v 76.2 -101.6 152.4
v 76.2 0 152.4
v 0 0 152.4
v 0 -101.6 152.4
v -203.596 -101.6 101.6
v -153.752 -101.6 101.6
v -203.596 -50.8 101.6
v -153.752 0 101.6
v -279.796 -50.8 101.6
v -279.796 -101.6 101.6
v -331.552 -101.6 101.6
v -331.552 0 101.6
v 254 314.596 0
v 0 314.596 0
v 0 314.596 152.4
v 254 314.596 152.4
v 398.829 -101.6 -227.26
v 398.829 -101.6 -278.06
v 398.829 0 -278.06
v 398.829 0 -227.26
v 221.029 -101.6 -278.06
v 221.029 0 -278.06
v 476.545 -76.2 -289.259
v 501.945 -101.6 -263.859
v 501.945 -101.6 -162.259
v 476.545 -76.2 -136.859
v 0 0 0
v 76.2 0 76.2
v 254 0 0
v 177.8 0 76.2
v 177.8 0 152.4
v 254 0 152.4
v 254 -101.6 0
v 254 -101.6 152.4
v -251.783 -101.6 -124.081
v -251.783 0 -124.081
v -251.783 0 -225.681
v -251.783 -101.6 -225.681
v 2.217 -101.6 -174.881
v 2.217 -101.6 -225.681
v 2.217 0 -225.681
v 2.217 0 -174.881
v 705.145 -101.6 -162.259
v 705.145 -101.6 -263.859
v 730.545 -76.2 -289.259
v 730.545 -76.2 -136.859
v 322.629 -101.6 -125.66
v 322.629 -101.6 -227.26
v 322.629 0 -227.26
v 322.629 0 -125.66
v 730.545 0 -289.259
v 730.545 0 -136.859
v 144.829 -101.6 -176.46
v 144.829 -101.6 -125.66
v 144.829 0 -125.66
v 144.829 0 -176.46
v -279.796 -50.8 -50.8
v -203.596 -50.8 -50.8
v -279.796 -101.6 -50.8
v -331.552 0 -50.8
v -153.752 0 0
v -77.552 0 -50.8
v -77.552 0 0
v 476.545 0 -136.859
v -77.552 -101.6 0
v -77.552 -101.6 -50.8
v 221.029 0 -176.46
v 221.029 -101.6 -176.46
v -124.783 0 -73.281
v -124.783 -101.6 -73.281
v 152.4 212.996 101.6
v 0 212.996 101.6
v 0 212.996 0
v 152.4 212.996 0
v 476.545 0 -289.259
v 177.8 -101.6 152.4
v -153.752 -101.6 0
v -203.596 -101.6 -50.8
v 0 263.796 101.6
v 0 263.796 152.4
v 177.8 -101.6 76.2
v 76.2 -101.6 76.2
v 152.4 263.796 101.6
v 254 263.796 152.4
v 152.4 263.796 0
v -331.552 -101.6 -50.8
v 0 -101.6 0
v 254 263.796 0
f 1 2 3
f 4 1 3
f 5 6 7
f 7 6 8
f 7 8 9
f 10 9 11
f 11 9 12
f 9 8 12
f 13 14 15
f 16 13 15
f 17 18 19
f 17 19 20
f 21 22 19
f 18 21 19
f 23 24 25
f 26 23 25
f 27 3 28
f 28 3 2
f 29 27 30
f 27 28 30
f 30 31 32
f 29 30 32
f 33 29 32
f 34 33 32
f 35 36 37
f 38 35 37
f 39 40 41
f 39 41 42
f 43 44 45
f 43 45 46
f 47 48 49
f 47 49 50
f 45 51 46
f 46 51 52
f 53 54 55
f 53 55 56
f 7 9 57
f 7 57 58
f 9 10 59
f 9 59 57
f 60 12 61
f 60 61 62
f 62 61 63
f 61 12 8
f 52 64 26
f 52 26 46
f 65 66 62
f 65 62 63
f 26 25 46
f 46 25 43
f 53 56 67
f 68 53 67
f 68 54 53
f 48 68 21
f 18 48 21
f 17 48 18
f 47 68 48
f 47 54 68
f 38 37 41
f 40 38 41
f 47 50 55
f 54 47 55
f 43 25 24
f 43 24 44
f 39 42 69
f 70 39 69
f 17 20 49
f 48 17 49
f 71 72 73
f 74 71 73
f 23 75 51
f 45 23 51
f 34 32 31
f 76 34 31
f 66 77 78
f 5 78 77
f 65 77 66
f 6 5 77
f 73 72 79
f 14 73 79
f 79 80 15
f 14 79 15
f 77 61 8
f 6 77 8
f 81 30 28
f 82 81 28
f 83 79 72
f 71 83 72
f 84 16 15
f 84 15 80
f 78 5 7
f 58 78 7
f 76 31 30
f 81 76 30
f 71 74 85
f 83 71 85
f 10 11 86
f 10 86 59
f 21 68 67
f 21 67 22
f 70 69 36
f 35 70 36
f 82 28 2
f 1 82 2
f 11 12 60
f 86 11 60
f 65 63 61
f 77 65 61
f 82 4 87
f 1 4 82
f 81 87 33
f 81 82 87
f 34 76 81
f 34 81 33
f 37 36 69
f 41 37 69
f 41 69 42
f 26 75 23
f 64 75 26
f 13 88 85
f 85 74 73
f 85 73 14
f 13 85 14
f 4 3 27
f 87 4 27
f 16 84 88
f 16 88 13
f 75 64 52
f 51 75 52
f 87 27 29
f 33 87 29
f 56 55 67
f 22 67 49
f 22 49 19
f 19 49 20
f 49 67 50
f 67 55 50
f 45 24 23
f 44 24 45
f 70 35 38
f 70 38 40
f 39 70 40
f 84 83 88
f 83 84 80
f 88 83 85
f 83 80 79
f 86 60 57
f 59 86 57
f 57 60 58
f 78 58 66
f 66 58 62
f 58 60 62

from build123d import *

# Parameters (mm, degrees)
F1_DEPTH  = 101.6
F3_DEPTH  = 254
F4_W      = 50.8
F4_H      = 101.6
F5_DEPTH  = 101.6
F7_DEPTH  = 101.6
F8_W      = 76.2
F8_H      = 50.8
F9_DEPTH  = 152.4
F11_DEPTH = 101.6
F13_DEPTH = 101.6
F14_W     = 254
F14_H     = 152.4
F15_DEPTH = 101.6
F16_SIZE  = 25.4


with BuildPart() as f1:
    # F0 (on Front) → F1 (new body)
    with BuildSketch(Plane.XZ):
        Polygon((0, 152.4), (0, 0), (254, 0), (254, 152.4), (177.8, 152.4), (177.8, 76.2), (76.2, 76.2), (76.2, 152.4), align=None)
    extrude(amount=F1_DEPTH)


with BuildPart() as f3:
    # F2 (on Right) → F3 (new body)
    with BuildSketch(Plane.YZ):
        Polygon((212.996044, 101.6), (212.996044, 0), (314.596044, 0), (314.596044, 152.4), (263.796044, 152.4), (263.796044, 101.6), align=None)
    extrude(amount=F3_DEPTH)

    # F4 (on face) → F5 (cut)
    with BuildSketch(Plane.YZ.offset(254)):
        with Locations((238.396044, 50.8)):
            Rectangle(F4_W, F4_H)
    extrude(amount=-F5_DEPTH, mode=Mode.SUBTRACT)


with BuildPart() as f7:
    # F6 (on Front) → F7 (new body)
    with BuildSketch(Plane.XZ):
        Polygon((-280.751735, 101.6), (-331.551735, 101.6), (-331.551735, -50.8), (-77.551735, -50.8), (-77.551735, 0), (-153.751735, 0), (-153.751735, 101.6), align=None)
    extrude(amount=F7_DEPTH)

    # F8 (on face) → F9 (cut)
    with BuildSketch(Plane.XY.offset(101.6)):
        with Locations((-241.695796, -76.2)):
            Rectangle(F8_W, F8_H)
    extrude(amount=-F9_DEPTH, mode=Mode.SUBTRACT)


with BuildPart() as f11:
    # F10 (on Front) → F11 (new body)
    with BuildSketch(Plane.XZ):
        Polygon((322.628757, -125.659592), (144.828757, -125.659592), (144.828757, -176.459592), (221.028757, -176.459592), (221.028757, -278.059592), (398.828757, -278.059592), (398.828757, -227.259592), (322.628757, -227.259592), align=None)
    extrude(amount=F11_DEPTH)


with BuildPart() as f13:
    # F12 (on Front) → F13 (new body)
    with BuildSketch(Plane.XZ):
        Polygon((-124.783009, -73.280629), (-251.783008, -124.080629), (-251.783008, -225.680629), (2.216992, -225.680629), (2.216992, -174.880629), align=None)
    extrude(amount=F13_DEPTH)


with BuildPart() as f15:
    # F14 (on Front) → F15 (new body)
    with BuildSketch(Plane.XZ):
        with Locations((603.545263, -213.058971)):
            Rectangle(F14_W, F14_H)
    extrude(amount=F15_DEPTH)

    # F16
    f16_edges = [f15.edges().sort_by_distance(p)[0] for p in [
        (603.545263, -101.6, -136.858971),
        (476.545263, -101.6, -213.058971),
        (603.545263, -101.6, -289.258971),
        (730.545263, -101.6, -213.058971),
    ]]
    chamfer(f16_edges, length=F16_SIZE)


solid = Compound([f1.part, f3.part, f7.part, f11.part, f13.part, f15.part])
